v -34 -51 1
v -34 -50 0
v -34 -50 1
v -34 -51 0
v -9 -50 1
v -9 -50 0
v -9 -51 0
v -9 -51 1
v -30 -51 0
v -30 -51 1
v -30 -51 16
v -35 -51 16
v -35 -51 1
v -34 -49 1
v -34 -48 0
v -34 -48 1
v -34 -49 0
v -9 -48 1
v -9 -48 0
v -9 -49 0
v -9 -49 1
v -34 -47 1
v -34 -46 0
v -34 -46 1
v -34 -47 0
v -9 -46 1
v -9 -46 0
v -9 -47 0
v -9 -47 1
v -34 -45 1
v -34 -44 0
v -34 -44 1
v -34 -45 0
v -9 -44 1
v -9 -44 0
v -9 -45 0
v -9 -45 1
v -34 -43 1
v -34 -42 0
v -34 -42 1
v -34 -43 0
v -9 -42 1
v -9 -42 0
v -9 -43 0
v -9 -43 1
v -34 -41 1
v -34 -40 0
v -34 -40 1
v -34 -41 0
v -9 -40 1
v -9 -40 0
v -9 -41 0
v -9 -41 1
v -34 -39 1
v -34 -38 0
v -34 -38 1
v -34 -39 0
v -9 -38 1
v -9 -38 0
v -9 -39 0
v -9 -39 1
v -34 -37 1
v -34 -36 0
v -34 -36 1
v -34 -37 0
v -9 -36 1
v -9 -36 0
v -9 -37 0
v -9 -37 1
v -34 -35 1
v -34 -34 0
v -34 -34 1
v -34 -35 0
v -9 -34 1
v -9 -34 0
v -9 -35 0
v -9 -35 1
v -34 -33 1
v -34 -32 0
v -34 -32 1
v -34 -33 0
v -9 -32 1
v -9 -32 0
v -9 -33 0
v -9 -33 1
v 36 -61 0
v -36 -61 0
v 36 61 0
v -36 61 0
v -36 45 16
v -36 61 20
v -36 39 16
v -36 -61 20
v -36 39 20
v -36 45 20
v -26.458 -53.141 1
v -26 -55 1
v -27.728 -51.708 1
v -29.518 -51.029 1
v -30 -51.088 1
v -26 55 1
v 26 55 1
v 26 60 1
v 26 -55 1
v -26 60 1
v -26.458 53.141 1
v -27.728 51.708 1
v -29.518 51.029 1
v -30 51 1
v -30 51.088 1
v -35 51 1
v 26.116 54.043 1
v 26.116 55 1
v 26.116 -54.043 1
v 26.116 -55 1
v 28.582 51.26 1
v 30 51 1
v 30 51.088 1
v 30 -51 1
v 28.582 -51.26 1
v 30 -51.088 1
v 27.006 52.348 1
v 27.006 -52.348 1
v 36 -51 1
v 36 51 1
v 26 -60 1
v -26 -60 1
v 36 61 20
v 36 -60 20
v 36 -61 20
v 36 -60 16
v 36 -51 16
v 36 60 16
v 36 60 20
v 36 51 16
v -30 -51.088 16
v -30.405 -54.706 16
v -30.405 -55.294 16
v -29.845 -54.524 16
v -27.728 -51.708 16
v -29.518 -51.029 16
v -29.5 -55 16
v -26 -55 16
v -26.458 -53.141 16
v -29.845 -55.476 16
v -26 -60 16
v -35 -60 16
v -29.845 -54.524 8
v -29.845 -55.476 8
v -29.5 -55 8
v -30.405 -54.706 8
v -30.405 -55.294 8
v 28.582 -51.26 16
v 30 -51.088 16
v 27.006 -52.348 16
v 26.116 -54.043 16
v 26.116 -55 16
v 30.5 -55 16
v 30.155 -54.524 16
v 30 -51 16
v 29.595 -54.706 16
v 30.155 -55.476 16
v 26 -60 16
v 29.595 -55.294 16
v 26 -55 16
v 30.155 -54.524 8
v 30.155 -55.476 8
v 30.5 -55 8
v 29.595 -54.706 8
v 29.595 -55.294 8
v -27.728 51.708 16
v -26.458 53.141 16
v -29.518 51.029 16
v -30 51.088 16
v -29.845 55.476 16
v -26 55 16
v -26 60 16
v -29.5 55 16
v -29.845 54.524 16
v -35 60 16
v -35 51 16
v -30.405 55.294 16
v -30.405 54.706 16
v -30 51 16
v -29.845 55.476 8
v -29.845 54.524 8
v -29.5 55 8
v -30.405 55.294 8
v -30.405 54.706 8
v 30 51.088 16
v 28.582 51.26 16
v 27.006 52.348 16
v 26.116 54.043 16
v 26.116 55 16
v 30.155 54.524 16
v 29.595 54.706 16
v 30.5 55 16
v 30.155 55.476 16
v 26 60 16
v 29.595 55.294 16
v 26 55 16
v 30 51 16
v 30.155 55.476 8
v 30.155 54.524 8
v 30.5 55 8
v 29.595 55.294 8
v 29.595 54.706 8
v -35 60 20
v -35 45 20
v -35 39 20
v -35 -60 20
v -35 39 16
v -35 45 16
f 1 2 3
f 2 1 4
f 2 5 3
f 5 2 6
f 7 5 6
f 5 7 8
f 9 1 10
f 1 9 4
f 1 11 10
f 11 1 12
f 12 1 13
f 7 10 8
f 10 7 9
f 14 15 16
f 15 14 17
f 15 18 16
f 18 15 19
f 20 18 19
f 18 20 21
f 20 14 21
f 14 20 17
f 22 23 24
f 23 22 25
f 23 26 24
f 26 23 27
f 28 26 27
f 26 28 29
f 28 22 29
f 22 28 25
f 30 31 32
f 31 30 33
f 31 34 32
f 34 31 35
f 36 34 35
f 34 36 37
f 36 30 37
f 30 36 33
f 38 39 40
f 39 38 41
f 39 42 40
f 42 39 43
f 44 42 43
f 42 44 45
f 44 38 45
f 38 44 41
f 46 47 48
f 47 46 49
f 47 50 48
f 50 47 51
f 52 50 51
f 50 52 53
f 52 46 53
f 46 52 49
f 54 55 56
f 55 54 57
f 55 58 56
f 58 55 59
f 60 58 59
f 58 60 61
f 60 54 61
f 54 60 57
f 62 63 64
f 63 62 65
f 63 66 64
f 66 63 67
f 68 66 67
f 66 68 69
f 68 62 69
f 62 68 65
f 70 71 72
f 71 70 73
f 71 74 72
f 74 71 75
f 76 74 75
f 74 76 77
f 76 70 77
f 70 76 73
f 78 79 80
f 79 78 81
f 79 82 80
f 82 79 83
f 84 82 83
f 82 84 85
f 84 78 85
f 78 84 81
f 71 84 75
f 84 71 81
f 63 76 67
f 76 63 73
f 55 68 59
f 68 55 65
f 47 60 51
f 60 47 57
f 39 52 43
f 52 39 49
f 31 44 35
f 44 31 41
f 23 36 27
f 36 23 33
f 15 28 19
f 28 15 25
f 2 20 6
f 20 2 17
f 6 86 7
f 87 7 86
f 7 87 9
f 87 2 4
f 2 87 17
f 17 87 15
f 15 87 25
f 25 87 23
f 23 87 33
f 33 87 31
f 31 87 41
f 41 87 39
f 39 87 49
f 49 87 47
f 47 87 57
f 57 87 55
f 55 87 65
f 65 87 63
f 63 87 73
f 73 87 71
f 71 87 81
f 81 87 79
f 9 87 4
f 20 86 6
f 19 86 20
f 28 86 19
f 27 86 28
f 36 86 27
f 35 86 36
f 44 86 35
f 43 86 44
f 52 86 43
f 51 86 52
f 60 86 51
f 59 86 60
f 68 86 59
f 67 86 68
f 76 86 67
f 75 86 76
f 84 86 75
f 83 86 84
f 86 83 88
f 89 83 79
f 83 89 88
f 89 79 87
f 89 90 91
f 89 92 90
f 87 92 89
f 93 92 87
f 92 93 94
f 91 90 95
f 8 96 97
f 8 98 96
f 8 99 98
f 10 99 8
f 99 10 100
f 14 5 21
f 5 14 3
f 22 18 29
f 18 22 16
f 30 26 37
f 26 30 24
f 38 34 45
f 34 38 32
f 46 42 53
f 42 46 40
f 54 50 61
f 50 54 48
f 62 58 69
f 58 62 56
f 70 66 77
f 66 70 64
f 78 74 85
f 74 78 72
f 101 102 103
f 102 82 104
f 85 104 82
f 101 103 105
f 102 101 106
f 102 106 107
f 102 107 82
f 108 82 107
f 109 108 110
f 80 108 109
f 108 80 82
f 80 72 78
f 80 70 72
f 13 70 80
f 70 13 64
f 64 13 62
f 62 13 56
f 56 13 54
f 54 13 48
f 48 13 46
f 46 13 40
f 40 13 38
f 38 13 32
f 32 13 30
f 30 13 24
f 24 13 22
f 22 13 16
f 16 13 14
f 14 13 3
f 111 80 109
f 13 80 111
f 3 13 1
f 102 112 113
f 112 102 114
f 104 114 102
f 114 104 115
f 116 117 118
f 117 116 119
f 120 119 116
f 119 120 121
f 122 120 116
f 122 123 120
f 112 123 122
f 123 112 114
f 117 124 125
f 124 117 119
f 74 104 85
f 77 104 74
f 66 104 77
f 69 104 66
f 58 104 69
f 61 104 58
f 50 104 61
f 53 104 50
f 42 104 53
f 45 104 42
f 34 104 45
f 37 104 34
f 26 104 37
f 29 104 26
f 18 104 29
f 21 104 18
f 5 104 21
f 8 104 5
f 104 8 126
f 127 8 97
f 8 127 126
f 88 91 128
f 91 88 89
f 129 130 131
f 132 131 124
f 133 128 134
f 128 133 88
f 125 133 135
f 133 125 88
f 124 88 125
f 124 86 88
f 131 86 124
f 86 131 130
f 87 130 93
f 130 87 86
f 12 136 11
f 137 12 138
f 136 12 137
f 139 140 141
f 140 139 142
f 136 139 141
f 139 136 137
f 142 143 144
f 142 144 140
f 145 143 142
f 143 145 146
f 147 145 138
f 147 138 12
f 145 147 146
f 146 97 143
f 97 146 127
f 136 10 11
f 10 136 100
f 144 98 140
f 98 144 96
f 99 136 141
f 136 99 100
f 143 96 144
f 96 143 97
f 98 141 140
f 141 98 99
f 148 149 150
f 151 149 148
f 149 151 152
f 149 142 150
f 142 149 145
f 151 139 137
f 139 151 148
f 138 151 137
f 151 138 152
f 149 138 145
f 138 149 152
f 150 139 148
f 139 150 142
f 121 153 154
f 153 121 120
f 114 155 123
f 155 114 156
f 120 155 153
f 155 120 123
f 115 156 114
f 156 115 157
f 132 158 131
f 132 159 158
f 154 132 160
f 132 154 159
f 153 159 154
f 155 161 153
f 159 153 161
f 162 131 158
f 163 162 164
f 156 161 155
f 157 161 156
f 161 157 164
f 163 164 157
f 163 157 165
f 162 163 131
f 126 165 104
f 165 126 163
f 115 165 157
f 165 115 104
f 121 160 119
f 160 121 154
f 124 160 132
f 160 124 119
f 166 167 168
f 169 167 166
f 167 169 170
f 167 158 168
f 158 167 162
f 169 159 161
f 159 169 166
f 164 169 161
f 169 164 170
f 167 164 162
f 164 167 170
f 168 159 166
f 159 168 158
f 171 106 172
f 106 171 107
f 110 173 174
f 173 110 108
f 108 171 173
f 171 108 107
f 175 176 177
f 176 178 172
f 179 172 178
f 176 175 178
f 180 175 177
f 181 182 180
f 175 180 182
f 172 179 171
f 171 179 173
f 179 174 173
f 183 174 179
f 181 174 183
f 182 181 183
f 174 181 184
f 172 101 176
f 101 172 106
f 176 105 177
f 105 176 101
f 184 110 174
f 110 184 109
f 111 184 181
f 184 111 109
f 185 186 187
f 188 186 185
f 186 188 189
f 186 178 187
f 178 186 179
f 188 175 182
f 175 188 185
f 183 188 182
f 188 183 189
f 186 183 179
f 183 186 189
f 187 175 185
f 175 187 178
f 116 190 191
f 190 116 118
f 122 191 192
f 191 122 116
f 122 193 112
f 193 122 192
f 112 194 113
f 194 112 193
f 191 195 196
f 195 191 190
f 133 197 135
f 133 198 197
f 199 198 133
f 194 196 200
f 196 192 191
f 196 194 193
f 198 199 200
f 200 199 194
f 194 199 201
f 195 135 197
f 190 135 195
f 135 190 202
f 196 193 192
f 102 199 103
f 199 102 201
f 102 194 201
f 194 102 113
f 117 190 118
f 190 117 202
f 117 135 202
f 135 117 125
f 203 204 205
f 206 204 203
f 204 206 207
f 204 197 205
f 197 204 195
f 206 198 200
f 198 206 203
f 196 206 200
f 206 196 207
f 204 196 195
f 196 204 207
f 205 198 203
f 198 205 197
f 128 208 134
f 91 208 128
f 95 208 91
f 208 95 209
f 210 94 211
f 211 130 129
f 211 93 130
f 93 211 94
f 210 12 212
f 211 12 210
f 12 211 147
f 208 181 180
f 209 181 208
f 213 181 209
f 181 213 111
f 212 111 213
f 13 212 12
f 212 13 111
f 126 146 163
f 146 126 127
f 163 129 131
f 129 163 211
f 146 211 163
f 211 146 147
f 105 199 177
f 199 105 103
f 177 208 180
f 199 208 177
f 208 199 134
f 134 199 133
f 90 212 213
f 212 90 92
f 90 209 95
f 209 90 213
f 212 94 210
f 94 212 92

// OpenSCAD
difference() {
translate([-36,-61,0]) linear_extrude(height=1) square([72,122]);
union() {
translate([-34,-51,-1]) linear_extrude(height=25) square([25,1]);
translate([-34,-49,-1]) linear_extrude(height=25) square([25,1]);
translate([-34,-47,-1]) linear_extrude(height=25) square([25,1]);
translate([-34,-45,-1]) linear_extrude(height=25) square([25,1]);
translate([-34,-43,-1]) linear_extrude(height=25) square([25,1]);
translate([-34,-41,-1]) linear_extrude(height=25) square([25,1]);
translate([-34,-39,-1]) linear_extrude(height=25) square([25,1]);
translate([-34,-37,-1]) linear_extrude(height=25) square([25,1]);
translate([-34,-35,-1]) linear_extrude(height=25) square([25,1]);
translate([-34,-33,-1]) linear_extrude(height=25) square([25,1]);



}
}

difference() {
union () {
translate([-36,-61,0]) linear_extrude(height=16) square([10,6]);
translate([-36,-61,0]) linear_extrude(height=16) square([6,10]);
translate([-30,-55,0]) linear_extrude(height=16) circle(4);
}
translate([-30,-55,8]) linear_extrude(height=16) circle(0.5);
}

difference() {
union () {
translate([30,-55,0]) linear_extrude(height=16) circle(4);
translate([26,-61,0]) linear_extrude(height=16) square([10,6]);
translate([30,-61,0]) linear_extrude(height=16) square([6,10]);
}
translate([30,-55,8]) linear_extrude(height=16) circle(0.5);
}



difference() {
union () {
translate([-30,55,0]) linear_extrude(height=16) circle(4);
translate([-36,55,0]) linear_extrude(height=16) square([10,6]);
translate([-36,51,0]) linear_extrude(height=16) square([6,10]);
}
translate([-30,55,8]) linear_extrude(height=16) circle(0.5);
}

difference() {
union () {
translate([30,55,0]) linear_extrude(height=16) circle(4);
translate([26,55,0]) linear_extrude(height=16) square([10,6]);
translate([30,51,0]) linear_extrude(height=16) square([6,10]);
}
translate([30,55,8]) linear_extrude(height=16) circle(0.5);
}

difference() {
union(){
translate([-36,-61,0]) linear_extrude(height=20) square([1,122]);
//translate([35,-61,0]) linear_extrude(height=20) square([1,122]);
translate([-36,-61,0]) linear_extrude(height=20) square([72,1]);
translate([-36, 60,0]) linear_extrude(height=20) square([72,1]);
}
translate([-38,39,16]) linear_extrude(height=10) square([5,6]);
}
